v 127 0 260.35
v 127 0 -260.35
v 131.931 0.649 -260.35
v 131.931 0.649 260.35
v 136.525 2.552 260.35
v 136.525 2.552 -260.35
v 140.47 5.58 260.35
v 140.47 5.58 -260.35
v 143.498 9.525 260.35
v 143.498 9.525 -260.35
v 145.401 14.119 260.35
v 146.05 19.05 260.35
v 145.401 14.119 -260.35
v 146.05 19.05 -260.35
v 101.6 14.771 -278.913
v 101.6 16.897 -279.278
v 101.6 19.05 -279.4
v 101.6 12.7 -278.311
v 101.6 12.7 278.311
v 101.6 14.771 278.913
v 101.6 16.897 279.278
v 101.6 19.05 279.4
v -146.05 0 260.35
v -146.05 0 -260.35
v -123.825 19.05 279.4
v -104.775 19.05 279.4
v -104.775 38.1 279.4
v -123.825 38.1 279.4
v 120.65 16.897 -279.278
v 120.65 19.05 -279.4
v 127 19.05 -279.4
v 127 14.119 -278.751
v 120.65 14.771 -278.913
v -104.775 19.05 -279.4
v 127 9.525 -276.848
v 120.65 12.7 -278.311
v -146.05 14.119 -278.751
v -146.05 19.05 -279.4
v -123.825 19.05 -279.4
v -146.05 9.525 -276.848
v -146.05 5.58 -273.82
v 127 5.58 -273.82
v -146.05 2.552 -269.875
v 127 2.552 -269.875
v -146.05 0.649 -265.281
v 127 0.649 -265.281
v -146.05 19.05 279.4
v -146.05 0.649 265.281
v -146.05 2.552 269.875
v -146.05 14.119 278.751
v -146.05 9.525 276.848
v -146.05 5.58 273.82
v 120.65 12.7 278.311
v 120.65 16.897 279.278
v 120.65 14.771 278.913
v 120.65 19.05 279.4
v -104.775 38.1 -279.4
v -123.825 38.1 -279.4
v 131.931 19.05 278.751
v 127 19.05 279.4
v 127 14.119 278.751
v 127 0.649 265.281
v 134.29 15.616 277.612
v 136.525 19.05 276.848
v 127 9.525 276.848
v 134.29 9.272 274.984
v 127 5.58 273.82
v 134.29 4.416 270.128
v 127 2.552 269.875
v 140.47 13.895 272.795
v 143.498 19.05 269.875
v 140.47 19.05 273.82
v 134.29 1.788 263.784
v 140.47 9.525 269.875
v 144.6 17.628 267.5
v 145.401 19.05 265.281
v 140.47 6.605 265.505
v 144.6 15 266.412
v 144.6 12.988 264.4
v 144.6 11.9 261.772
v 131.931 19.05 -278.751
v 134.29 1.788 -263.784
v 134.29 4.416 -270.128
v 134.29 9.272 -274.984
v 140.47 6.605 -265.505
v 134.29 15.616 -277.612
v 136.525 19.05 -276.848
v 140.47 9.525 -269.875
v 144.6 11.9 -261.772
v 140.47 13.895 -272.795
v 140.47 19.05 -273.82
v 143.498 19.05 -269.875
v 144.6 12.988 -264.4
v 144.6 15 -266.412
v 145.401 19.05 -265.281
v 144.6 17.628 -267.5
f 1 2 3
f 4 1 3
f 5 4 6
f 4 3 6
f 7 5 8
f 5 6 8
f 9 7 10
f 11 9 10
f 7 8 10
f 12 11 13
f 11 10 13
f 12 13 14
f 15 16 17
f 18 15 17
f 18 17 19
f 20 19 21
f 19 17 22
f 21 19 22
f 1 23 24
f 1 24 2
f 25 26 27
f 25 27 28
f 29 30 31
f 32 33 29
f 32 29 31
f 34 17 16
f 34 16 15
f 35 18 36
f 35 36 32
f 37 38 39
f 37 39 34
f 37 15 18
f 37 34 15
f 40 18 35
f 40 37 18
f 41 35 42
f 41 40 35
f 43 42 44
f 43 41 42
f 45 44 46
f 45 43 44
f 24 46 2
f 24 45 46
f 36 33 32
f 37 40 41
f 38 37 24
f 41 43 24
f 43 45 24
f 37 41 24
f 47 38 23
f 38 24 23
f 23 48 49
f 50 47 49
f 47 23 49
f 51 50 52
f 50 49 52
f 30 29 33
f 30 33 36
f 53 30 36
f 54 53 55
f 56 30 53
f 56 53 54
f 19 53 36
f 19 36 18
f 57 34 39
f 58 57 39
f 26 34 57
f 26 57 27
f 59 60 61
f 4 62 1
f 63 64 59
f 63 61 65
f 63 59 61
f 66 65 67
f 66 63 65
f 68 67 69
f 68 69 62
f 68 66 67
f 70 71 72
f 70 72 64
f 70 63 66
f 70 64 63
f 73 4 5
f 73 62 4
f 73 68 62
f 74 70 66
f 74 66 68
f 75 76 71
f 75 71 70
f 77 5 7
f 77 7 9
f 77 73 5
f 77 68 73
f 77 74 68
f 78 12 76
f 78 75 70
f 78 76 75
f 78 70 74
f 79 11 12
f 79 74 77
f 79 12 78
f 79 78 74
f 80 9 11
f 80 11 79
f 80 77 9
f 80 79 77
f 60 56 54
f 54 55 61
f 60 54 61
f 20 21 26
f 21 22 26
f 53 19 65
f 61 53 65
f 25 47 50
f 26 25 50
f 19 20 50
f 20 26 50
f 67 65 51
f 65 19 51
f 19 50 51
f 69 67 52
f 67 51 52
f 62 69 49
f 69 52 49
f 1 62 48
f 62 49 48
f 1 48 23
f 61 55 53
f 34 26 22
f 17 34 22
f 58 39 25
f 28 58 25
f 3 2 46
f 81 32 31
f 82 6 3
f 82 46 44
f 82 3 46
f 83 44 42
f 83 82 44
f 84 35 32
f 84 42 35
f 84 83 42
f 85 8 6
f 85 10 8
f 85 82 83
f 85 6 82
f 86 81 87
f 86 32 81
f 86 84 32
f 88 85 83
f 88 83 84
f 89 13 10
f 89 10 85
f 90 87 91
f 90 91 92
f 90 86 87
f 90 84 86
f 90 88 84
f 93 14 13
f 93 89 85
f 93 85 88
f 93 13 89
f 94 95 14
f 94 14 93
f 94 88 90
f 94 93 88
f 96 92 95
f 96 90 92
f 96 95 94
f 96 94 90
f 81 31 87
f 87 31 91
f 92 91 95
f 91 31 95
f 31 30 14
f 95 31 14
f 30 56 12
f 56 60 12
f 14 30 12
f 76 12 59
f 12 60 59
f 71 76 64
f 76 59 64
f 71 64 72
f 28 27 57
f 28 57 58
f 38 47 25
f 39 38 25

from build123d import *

# Parameters (mm, degrees)
F0_W         = 292.1
F0_H         = 558.8
F1_DEPTH     = 19.05
F3_W         = 19.05
F3_H         = 558.8
F4_DEPTH     = 6.35
F5_T1_DEPTH  = 320.675
F5_T3_DEPTH  = 520.7
F5_T5_DEPTH  = 47.625
F5_S9_W      = 19.05
F5_S9_H      = 19.05
F5_T10_DEPTH = 19.05
F5_S15_W     = 19.05
F5_S15_H     = 19.05
F5_T16_DEPTH = 19.05
F6_W         = 19.05
F6_H         = 558.8
F7_DEPTH     = 19.05


# Not quite as in the source:
# - a fillet or chamfer that OpenCascade refuses, or shapes differently, is made with other operations: its cross-section is extruded or revolved along the edge and cut away or added


with BuildPart() as f1:
    # F0 (on Front) → F1 (new body)
    with BuildSketch(Plane.XZ):
        Rectangle(F0_W, F0_H)
    extrude(amount=-F1_DEPTH)

    # F3 (on face) → F4 (cut)
    with BuildSketch(Plane(origin=(0, 19.05, 0), x_dir=(-1, 0, 0), z_dir=(0, 1, 0))):
        with Locations((-111.125, 0)):
            Rectangle(F3_W, F3_H)
    extrude(amount=-F4_DEPTH, mode=Mode.SUBTRACT)

    # F5: fillet of radius 19.05 on 5 edges, made by hand

    # F5_s2 → F5_t1 (cut)
    with BuildSketch(Plane.YZ.offset(-193.675)):
        with BuildLine():
            ThreePointArc((19.05, -279.4), (5.5796158184, -273.8203841816), (0, -260.35))
            Line((0, -260.35), (0, -279.4))
            Line((0, -279.4), (19.05, -279.4))
        make_face()
        with BuildLine():
            ThreePointArc((19.05, 279.4), (5.5796158184, 273.8203841816), (0, 260.35))
            Line((0, 260.35), (0, 279.4))
            Line((0, 279.4), (19.05, 279.4))
        make_face()
    extrude(amount=F5_T1_DEPTH, mode=Mode.SUBTRACT)

    # F5_s4 → F5_t3 (cut)
    with BuildSketch(Plane.XY.offset(-260.35)):
        with BuildLine():
            ThreePointArc((127, 0), (140.4703841816, 5.5796158184), (146.05, 19.05))
            Line((146.05, 19.05), (146.05, 0))
            Line((146.05, 0), (127, 0))
        make_face()
    extrude(amount=F5_T3_DEPTH, mode=Mode.SUBTRACT)

    # F5_s6 → F5_t5 (cut)
    with BuildSketch(Plane.XZ.offset(-66.675)):
        with BuildLine():
            ThreePointArc((127, -279.4), (140.4703841816, -273.8203841816), (146.05, -260.35))
            Line((146.05, -260.35), (146.05, -279.4))
            Line((146.05, -279.4), (127, -279.4))
        make_face()
        with BuildLine():
            ThreePointArc((127, 279.4), (140.4703841816, 273.8203841816), (146.05, 260.35))
            Line((146.05, 260.35), (146.05, 279.4))
            Line((146.05, 279.4), (127, 279.4))
        make_face()
    extrude(amount=F5_T5_DEPTH, mode=Mode.SUBTRACT)


with BuildPart() as f5_tool8:
    # F5_s9 → F5_t10 (new body)
    with BuildSketch(Plane.YZ.offset(127)):
        with Locations((9.525, -269.875)):
            Rectangle(F5_S9_W, F5_S9_H)
    extrude(amount=F5_T10_DEPTH)

    # F5_s11 → F5_t12 (revolve, cut)
    with BuildSketch(Plane(origin=(127, 19.05, -260.35), x_dir=(0, 0.7071067812, 0.7071067812), z_dir=(0, 0.7071067812, -0.7071067812))):
        with BuildLine():
            ThreePointArc((0, -19.05), (19.05, 0), (0, 19.05))
            Line((0, 19.05), (0, -19.05))
        make_face()
    revolve(axis=Axis((127, 19.05, -260.35), (1, 0, 0)), mode=Mode.SUBTRACT)


with BuildPart() as f1_1:
    add(f1.part)

    # F5_t7: cut F5_tool8
    add(f5_tool8.part, mode=Mode.SUBTRACT)


with BuildPart() as f5_tool14:
    # F5_s15 → F5_t16 (new body)
    with BuildSketch(Plane.YZ.offset(127)):
        with Locations((9.525, 269.875)):
            Rectangle(F5_S15_W, F5_S15_H)
    extrude(amount=F5_T16_DEPTH)

    # F5_s17 → F5_t18 (revolve, cut)
    with BuildSketch(Plane(origin=(127, 19.05, 260.35), x_dir=(0, 0.7071067812, -0.7071067812), z_dir=(0, -0.7071067812, -0.7071067812))):
        with BuildLine():
            ThreePointArc((0, -19.05), (19.05, 0), (0, 19.05))
            Line((0, 19.05), (0, -19.05))
        make_face()
    revolve(axis=Axis((127, 19.05, 260.35), (1, 0, 0)), mode=Mode.SUBTRACT)


with BuildPart() as f1_2:
    add(f1_1.part)

    # F5_t13: cut F5_tool14
    add(f5_tool14.part, mode=Mode.SUBTRACT)

    # F6 (on face) → F7 (join)
    with BuildSketch(Plane(origin=(0, 19.05, 0), x_dir=(-1, 0, 0), z_dir=(0, 1, 0))):
        with Locations((114.3, 0)):
            Rectangle(F6_W, F6_H)
    extrude(amount=F7_DEPTH)


solid = f1_2.part
